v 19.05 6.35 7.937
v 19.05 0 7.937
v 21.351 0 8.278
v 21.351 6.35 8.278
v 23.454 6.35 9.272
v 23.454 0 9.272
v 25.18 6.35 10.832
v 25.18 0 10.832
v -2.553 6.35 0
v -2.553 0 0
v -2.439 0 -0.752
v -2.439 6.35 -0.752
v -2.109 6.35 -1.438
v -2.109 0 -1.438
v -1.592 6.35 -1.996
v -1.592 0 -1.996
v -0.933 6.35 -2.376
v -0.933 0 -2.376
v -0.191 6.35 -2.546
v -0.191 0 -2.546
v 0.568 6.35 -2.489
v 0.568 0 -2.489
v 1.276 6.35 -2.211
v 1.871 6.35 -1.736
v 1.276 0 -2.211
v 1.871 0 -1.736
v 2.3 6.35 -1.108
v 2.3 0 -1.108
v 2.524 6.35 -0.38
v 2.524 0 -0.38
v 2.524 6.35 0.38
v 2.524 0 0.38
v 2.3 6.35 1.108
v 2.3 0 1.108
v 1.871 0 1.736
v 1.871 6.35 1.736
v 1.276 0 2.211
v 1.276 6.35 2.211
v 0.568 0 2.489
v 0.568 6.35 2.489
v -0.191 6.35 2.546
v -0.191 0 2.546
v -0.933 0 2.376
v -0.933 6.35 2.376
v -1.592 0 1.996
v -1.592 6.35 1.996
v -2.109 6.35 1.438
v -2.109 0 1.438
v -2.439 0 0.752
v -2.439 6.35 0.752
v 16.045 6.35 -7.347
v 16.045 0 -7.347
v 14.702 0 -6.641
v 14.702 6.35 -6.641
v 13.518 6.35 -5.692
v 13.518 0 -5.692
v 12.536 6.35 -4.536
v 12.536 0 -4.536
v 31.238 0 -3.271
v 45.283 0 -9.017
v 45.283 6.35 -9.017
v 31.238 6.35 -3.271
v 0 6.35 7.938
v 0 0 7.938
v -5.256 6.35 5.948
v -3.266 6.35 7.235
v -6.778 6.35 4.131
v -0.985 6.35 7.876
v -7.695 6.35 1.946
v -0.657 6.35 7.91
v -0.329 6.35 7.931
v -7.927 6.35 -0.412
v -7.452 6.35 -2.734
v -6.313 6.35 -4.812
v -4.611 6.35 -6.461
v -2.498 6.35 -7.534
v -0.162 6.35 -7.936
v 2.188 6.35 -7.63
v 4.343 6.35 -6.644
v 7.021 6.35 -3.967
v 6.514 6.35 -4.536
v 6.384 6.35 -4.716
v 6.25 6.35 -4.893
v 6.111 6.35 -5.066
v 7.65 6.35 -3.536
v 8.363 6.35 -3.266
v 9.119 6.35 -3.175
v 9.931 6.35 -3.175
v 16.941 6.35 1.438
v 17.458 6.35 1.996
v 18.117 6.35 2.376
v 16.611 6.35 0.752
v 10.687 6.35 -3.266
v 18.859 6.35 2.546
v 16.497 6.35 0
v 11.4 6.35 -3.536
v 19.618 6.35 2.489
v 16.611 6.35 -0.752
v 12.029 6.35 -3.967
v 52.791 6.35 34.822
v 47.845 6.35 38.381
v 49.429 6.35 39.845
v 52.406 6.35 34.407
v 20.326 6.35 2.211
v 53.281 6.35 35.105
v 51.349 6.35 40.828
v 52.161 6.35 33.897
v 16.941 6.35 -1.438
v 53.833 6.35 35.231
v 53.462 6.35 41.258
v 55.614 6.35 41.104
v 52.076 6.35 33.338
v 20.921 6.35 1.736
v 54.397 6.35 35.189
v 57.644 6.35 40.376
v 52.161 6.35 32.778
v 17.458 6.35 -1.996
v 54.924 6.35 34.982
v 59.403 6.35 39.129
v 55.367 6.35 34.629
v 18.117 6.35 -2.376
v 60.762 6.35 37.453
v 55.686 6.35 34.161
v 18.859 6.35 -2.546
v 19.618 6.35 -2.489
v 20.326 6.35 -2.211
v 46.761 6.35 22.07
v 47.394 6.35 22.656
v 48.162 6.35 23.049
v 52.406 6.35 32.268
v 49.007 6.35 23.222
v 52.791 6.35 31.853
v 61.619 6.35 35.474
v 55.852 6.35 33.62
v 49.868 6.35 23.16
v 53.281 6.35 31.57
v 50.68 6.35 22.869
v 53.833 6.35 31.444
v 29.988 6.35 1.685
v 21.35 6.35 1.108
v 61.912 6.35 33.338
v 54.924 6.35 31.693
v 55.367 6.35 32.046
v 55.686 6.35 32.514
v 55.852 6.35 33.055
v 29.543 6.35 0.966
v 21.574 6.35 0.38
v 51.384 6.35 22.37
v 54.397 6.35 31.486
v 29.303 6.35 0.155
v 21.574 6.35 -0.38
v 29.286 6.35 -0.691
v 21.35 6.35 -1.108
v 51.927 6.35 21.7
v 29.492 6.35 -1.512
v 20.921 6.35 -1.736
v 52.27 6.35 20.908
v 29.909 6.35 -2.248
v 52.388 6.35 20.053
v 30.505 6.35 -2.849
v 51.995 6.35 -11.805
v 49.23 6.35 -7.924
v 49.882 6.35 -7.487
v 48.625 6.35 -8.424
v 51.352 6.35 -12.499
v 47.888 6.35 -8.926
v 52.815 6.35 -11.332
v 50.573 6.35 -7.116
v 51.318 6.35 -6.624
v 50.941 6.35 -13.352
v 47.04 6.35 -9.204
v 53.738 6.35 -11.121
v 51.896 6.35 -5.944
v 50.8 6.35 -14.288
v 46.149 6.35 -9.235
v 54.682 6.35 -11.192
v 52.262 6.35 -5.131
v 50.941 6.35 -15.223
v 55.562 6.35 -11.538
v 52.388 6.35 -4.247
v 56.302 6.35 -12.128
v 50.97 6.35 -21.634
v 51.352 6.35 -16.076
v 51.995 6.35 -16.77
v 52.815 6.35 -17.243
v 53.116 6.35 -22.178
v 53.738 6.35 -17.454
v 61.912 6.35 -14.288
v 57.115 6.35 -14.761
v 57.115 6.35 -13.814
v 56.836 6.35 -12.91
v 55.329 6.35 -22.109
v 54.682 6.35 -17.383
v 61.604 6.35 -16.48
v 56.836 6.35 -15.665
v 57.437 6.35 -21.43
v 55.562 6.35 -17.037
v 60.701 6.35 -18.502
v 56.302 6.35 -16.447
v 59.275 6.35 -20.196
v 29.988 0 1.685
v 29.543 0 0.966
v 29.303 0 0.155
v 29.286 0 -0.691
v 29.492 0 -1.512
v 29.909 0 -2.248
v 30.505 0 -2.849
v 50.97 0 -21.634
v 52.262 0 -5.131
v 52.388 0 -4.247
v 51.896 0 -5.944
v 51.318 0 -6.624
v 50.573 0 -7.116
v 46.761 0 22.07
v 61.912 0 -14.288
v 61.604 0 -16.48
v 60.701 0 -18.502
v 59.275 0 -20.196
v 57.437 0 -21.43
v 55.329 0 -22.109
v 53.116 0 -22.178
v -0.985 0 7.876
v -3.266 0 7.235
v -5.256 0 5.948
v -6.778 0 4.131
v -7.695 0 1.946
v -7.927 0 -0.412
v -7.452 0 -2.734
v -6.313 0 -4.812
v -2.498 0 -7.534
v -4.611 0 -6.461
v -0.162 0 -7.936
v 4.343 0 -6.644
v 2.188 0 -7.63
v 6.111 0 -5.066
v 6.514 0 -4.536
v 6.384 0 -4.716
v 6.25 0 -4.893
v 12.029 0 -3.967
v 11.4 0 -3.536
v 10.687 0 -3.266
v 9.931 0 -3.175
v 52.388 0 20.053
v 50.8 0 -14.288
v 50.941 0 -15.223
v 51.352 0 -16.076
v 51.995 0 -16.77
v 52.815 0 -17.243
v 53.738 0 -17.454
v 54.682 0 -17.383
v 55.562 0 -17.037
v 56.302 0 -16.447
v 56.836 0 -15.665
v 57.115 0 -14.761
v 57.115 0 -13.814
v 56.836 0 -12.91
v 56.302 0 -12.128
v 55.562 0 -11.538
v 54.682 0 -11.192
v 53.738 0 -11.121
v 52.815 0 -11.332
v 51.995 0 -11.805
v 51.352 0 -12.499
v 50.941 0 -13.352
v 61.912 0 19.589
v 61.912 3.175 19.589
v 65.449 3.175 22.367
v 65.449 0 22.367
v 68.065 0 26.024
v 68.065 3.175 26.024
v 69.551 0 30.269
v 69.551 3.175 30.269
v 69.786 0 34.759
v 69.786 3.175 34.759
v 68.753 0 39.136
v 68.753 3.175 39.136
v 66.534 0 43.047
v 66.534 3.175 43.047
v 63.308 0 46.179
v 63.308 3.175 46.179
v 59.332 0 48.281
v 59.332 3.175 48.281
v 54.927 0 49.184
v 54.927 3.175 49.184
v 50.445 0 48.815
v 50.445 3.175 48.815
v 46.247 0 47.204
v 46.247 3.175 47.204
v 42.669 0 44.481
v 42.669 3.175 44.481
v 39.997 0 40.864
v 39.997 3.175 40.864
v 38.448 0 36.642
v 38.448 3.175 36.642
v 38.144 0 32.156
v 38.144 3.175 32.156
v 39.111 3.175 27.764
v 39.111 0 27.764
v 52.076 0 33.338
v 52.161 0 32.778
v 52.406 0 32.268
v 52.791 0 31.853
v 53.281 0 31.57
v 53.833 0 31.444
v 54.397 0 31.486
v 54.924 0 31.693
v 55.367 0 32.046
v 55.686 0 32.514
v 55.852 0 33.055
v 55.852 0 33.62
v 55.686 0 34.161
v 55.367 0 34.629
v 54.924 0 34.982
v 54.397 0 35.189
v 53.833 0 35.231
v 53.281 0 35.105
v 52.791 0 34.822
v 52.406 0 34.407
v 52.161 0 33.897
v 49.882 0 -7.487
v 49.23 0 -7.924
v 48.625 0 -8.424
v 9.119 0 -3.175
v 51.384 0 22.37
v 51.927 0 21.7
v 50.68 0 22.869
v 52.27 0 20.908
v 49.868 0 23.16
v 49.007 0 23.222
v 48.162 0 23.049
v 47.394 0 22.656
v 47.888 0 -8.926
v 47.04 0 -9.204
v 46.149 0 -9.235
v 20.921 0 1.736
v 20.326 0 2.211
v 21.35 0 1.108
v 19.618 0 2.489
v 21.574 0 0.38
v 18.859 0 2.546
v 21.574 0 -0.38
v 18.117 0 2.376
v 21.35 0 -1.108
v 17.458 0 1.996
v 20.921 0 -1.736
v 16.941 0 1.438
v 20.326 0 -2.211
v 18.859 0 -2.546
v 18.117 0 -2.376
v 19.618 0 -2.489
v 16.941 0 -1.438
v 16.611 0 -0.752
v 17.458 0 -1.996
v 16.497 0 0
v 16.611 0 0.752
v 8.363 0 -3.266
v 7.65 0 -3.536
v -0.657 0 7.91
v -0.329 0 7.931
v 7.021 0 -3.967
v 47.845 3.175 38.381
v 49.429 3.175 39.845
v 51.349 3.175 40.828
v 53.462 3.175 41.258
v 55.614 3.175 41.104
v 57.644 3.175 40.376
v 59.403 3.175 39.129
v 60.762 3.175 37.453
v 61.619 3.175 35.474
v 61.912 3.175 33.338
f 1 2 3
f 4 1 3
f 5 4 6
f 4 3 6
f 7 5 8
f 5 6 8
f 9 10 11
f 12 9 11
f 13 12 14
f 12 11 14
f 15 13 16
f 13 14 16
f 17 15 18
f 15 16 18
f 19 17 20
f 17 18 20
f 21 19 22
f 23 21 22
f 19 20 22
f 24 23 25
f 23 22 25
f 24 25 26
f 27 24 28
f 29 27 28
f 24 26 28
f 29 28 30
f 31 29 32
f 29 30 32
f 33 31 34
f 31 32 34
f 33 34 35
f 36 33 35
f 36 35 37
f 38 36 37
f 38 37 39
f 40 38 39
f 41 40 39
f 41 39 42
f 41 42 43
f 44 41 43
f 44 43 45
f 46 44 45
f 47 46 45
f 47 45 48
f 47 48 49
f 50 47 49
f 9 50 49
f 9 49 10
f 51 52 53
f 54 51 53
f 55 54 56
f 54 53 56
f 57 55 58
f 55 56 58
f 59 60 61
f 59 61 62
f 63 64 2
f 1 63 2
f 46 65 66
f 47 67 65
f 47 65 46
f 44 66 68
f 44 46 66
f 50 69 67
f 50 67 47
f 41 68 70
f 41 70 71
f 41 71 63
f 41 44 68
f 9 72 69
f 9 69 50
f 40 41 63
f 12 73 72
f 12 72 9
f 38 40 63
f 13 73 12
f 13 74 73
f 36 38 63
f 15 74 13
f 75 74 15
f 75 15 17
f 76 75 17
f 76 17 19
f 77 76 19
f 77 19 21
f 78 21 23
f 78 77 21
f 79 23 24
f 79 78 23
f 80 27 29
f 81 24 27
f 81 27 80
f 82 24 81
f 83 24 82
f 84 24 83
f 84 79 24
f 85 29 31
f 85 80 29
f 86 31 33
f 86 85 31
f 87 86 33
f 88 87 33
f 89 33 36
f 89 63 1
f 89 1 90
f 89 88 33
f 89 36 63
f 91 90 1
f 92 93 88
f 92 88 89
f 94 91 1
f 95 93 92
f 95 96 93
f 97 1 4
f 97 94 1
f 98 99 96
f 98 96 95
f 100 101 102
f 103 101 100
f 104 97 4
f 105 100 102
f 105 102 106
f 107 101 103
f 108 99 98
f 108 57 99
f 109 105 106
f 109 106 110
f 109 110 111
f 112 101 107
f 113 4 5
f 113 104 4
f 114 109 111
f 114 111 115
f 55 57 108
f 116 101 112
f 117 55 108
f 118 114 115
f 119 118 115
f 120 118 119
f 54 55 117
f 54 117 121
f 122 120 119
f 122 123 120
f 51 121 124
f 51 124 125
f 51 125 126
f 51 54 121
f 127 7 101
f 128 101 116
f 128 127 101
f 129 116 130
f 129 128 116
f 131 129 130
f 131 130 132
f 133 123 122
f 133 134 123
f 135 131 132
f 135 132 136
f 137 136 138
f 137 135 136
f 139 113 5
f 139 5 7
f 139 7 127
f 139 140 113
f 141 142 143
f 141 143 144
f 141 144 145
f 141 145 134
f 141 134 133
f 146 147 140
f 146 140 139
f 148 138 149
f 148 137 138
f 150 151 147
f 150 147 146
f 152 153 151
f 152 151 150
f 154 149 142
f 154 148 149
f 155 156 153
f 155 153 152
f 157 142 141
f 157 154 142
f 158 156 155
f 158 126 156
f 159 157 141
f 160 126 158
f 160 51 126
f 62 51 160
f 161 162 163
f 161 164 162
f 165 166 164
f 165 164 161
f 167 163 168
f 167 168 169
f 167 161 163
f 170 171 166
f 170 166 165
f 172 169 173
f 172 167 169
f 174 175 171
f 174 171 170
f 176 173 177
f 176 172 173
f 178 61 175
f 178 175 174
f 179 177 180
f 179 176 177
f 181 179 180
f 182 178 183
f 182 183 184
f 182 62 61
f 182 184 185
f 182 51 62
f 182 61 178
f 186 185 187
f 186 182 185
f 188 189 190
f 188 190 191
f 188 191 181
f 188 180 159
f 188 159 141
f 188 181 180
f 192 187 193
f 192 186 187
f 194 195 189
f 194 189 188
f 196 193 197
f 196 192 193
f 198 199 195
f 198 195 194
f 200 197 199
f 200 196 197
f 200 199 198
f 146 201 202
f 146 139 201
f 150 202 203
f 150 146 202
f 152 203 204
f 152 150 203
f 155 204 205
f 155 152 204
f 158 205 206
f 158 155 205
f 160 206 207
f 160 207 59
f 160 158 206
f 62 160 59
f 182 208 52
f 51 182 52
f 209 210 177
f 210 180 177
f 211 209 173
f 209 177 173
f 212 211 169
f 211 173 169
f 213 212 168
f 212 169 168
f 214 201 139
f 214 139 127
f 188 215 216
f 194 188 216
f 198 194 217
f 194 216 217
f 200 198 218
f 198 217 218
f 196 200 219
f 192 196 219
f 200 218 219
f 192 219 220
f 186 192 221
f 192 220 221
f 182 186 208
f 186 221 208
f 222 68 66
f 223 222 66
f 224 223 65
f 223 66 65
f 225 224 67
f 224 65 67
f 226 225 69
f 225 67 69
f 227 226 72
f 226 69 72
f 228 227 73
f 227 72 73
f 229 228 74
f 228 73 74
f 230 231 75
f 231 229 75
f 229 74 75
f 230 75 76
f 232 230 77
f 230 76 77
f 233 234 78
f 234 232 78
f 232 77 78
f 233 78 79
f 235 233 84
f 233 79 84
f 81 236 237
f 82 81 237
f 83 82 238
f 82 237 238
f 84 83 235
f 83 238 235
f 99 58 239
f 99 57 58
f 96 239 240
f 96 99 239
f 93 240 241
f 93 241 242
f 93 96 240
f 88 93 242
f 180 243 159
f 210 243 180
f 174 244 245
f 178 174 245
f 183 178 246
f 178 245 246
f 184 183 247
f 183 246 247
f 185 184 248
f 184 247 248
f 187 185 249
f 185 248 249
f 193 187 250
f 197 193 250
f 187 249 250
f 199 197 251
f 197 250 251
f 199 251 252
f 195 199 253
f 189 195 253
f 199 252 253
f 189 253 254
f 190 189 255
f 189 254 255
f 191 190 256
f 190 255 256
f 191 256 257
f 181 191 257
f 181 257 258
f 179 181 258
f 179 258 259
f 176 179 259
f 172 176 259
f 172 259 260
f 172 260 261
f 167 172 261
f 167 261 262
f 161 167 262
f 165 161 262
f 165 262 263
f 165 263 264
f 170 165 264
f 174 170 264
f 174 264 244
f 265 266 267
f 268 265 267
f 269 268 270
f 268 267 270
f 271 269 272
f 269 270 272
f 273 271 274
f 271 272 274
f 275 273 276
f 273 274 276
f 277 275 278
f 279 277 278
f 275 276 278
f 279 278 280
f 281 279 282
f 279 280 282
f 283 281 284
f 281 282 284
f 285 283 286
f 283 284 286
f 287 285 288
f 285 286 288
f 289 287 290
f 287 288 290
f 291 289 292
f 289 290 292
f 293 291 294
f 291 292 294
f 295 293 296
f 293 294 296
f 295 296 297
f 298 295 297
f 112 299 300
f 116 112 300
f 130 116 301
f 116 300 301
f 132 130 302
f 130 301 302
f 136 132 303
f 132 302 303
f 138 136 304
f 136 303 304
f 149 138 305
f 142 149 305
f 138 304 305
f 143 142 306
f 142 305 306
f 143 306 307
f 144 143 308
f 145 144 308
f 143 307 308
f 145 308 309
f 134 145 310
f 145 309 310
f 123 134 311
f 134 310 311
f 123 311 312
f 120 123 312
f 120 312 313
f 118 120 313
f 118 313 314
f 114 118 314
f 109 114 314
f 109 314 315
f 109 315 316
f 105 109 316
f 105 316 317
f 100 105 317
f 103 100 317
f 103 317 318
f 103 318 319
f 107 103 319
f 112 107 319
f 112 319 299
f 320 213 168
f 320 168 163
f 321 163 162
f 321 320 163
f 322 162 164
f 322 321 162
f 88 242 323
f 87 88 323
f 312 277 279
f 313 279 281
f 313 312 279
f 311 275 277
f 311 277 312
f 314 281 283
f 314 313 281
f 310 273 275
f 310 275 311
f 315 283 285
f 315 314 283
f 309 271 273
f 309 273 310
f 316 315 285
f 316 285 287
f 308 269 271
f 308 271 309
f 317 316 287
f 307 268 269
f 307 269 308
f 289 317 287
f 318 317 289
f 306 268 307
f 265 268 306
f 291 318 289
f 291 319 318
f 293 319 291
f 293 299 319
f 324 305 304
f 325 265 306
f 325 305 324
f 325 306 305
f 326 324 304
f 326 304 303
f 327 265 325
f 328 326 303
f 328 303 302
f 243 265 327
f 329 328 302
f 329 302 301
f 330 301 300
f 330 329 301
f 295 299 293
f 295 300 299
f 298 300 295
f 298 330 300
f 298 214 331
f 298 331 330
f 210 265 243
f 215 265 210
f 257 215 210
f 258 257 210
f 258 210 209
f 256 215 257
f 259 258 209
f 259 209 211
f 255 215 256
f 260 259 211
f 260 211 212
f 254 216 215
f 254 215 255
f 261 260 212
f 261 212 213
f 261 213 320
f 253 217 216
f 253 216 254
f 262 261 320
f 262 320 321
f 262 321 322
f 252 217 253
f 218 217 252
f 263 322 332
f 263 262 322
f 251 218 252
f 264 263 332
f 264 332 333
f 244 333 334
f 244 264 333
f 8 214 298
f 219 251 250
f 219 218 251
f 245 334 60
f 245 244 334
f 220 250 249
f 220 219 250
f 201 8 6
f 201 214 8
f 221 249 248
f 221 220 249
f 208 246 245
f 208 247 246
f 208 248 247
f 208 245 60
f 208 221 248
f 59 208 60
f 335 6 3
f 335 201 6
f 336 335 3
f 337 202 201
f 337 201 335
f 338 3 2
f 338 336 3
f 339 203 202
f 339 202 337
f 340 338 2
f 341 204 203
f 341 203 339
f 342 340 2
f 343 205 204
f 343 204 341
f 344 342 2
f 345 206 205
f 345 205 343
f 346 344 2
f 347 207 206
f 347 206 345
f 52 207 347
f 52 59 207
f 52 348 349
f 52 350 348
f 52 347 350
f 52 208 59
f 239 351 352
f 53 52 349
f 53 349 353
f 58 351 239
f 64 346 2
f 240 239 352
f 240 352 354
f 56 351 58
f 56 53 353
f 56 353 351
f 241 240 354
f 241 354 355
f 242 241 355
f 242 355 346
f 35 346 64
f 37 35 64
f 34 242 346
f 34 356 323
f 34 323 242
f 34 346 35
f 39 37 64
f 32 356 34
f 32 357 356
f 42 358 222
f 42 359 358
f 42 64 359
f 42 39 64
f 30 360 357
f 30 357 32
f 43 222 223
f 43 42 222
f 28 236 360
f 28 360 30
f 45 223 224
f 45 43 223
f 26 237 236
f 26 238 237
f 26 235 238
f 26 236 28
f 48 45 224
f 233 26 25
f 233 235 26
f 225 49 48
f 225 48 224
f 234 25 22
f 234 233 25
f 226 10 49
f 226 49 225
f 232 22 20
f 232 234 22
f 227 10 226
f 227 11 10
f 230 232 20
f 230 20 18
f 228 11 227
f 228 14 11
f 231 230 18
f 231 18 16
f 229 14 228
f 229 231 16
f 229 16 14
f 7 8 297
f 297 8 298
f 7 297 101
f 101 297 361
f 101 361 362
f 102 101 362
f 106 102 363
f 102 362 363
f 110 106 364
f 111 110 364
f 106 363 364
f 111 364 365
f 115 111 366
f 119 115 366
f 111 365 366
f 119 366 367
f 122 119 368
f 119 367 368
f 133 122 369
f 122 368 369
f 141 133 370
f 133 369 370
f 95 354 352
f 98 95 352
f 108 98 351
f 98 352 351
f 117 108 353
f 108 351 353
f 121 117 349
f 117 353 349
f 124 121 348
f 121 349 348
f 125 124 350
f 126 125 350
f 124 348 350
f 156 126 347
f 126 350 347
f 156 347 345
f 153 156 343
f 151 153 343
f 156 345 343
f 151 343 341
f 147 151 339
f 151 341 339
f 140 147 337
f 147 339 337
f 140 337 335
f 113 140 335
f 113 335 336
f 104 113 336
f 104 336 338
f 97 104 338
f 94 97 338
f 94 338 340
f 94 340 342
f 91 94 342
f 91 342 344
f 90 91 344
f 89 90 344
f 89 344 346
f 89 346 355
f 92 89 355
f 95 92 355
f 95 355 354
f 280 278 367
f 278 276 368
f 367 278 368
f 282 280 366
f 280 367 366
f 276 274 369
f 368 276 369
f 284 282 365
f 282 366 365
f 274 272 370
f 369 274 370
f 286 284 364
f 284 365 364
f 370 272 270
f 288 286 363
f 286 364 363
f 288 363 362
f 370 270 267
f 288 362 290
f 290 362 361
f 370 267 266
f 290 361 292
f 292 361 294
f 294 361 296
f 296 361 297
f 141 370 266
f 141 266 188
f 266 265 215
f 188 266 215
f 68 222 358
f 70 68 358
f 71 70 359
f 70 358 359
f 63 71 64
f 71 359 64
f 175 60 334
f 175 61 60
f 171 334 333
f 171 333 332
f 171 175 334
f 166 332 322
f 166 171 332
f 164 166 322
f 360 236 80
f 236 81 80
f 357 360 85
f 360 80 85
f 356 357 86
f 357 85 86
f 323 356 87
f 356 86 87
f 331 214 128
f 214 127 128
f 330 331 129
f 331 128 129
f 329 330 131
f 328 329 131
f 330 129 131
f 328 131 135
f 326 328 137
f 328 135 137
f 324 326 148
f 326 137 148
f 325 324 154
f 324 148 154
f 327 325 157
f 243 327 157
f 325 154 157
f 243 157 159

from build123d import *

# Parameters (mm, degrees)
BOSS_EXTRUDE1_DEPTH         = 6.35
FILLET3_R                   = 3.175
F_10_CLEARANCE_HOLE1_D      = 5.1054
F_1_4_0_25_DIAMETER_HOLE1_D = 6.35
FILLET2_R                   = 3.175
F_10_24_TAPPED_HOLE1_D      = 3.7973
BOSS_EXTRUDE2_START         = -3.175
BOSS_EXTRUDE2_DEPTH         = 3.175
CUT_EXTRUDE1_DEPTH          = 7.35


with BuildPart() as part:
    # Sketch1 → Boss-Extrude1 (new body)
    with BuildSketch(Plane(origin=(0, 0, 0), x_dir=(1, 0, 0), z_dir=(0, 1, 0))):
        with BuildLine():
            Line((0, -7.9375), (19.05, -7.9375))
            ThreePointArc((19.05, -7.9375), (22.439261793, -8.697478788), (25.179511411, -10.831886268))
            Line((25.179511411, -10.831886268), (47.845488589, -38.380613732))
            ThreePointArc((47.845488589, -38.380613732), (56.653703924, -40.809343918), (61.9125, -33.3375))
            Line((61.9125, -33.3375), (61.9125, 14.2875))
            ThreePointArc((61.9125, 14.2875), (58.399282876, 20.877615878), (50.969601787, 21.634028965))
            Line((50.969601787, 21.634028965), (16.044601787, 7.346528965))
            ThreePointArc((16.044601787, 7.346528965), (13.502817622, 5.677382664), (11.775161084, 3.175))
            Line((11.775161084, 3.175), (7.274838916, 3.175))
            ThreePointArc((7.274838916, 3.175), (6.75922379, 4.161345937), (6.110713691, 5.065874499))
            Line((6.110713691, 5.065874499), (-18.894457111, 35.228374499))
            ThreePointArc((-18.894457111, 35.228374499), (-23.603599947, 37.97527834), (-28.973920802, 37.036576643))
            Line((-28.973920802, 37.036576643), (-67.46875, 14.811576643))
            ThreePointArc((-67.46875, 14.811576643), (-71.279874161, 6.363503718), (-64.484525706, 0.061294354))
            Line((-64.484525706, 0.061294354), (-0.984525706, -7.876205646))
            ThreePointArc((-0.984525706, -7.876205646), (-0.493215942, -7.922161592), (0, -7.9375))
        make_face()
        with BuildLine():
            Line((27.252413672, 1.640330855), (52.3875, -28.909406206))
            Line((52.3875, -28.909406206), (52.3875, 6.510370067))
            ThreePointArc((52.3875, 6.510370067), (49.550717124, 7.697384122), (47.377980705, 9.873517369))
            Line((47.377980705, 9.873517369), (27.252413672, 1.640330855))
        make_face(mode=Mode.SUBTRACT)
        with BuildLine():
            Line((-49.23043706, 7.753658904), (-11.734122555, 3.066619591))
            ThreePointArc((-11.734122555, 3.066619591), (-8.556248755, 4.690794106), (-8.896026797, 8.243451649))
            Line((-8.896026797, 8.243451649), (-21.263790491, 23.162072897))
            ThreePointArc((-21.263790491, 23.162072897), (-26.406741657, 22.34972166), (-30.946612893, 24.899119705))
            Line((-30.946612893, 24.899119705), (-50.424126778, 13.65377182))
            ThreePointArc((-50.424126778, 13.65377182), (-51.948576442, 10.27454265), (-49.23043706, 7.753658904))
        make_face(mode=Mode.SUBTRACT)
    extrude(amount=BOSS_EXTRUDE1_DEPTH)

    # Fillet3
    fillet3_edges = [part.edges().sort_by_distance(p)[0] for p in [
        (47.377980705, 3.175, -9.873517369),
        (27.252413672, 3.175, -1.640330855),
        (52.3875, 3.175, 28.909406206),
        (52.3875, 3.175, -6.510370067),
        (-21.263790491, 3.175, -23.162072897),
        (-30.946612893, 3.175, -24.899119705),
    ]]
    fillet(fillet3_edges, radius=FILLET3_R)

    # #10 Clearance Hole1 (through all)
    with Locations(Plane(origin=(0, 6.35, 0), x_dir=(1, 0, 0), z_dir=(0, 1, 0))):
        with Locations((0, 0), (19.05, 0)):
            Hole(F_10_CLEARANCE_HOLE1_D / 2)

    # 1/4 (0.25) Diameter Hole1 (through all)
    with Locations(Plane(origin=(0, 6.35, 0), x_dir=(1, 0, 0), z_dir=(0, 1, 0))):
        with Locations((53.975, 14.2875), (-63.5, 7.9375)):
            Hole(F_1_4_0_25_DIAMETER_HOLE1_D / 2)

    # Fillet2
    fillet2_edges = [part.edges().sort_by_distance(p)[0] for p in [
        (7.274838916, 3.175, -3.175),
        (11.775161084, 3.175, -3.175),
    ]]
    fillet(fillet2_edges, radius=FILLET2_R)

    # #10-24 Tapped Hole1 (through all)
    with Locations(Plane(origin=(0, 6.35, 0), x_dir=(1, 0, 0), z_dir=(0, 1, 0))):
        with Locations((53.975, -33.3375), (-25.005170802, 30.1625)):
            Hole(F_10_24_TAPPED_HOLE1_D / 2)

    # Sketch8 → Boss-Extrude2 (add)
    with BuildSketch(Plane(origin=(0, 6.35, 0), x_dir=(1, 0, 0), z_dir=(0, 1, 0)).offset(BOSS_EXTRUDE2_START)):
        with BuildLine():
            Line((39.110559377, -27.763988542), (47.845488589, -38.380613732))
            ThreePointArc((47.845488589, -38.380613732), (56.653703924, -40.809343918), (61.9125, -33.3375))
            Line((61.9125, -33.3375), (61.9125, -19.589346715))
            ThreePointArc((61.9125, -19.589346715), (59.332407848, -48.281187836), (39.110559377, -27.763988542))
        make_face()
        with BuildLine():
            Line((-28.973920802, 37.036576643), (-40.880170802, 30.1625))
            ThreePointArc((-40.880170802, 30.1625), (-22.202029092, 45.78805668), (-10.120105094, 24.644307915))
            Line((-10.120105094, 24.644307915), (-18.894457111, 35.228374499))
            ThreePointArc((-18.894457111, 35.228374499), (-23.603599947, 37.97527834), (-28.973920802, 37.036576643))
        make_face()
    extrude(amount=-BOSS_EXTRUDE2_DEPTH)

    # Sketch9 → Cut-Extrude1 (cut, through all)
    with BuildSketch(Plane(origin=(0, 6.35, 0), x_dir=(1, 0, 0), z_dir=(0, 1, 0))):
        with BuildLine():
            Line((6.110713691, 5.065874499), (-10.120105094, 24.644307915))
            ThreePointArc((-10.120105094, 24.644307915), (-22.202029092, 45.78805668), (-40.880170802, 30.1625))
            Line((-40.880170802, 30.1625), (-67.46875, 14.811576643))
            ThreePointArc((-67.46875, 14.811576643), (-71.279874161, 6.363503718), (-64.484525706, 0.061294354))
            Line((-64.484525706, 0.061294354), (-0.984525706, -7.876205646))
            ThreePointArc((-0.984525706, -7.876205646), (-6.960158794, 3.815769361), (6.110713691, 5.065874499))
        make_face()
    extrude(amount=-CUT_EXTRUDE1_DEPTH, mode=Mode.SUBTRACT)


solid = part.part
